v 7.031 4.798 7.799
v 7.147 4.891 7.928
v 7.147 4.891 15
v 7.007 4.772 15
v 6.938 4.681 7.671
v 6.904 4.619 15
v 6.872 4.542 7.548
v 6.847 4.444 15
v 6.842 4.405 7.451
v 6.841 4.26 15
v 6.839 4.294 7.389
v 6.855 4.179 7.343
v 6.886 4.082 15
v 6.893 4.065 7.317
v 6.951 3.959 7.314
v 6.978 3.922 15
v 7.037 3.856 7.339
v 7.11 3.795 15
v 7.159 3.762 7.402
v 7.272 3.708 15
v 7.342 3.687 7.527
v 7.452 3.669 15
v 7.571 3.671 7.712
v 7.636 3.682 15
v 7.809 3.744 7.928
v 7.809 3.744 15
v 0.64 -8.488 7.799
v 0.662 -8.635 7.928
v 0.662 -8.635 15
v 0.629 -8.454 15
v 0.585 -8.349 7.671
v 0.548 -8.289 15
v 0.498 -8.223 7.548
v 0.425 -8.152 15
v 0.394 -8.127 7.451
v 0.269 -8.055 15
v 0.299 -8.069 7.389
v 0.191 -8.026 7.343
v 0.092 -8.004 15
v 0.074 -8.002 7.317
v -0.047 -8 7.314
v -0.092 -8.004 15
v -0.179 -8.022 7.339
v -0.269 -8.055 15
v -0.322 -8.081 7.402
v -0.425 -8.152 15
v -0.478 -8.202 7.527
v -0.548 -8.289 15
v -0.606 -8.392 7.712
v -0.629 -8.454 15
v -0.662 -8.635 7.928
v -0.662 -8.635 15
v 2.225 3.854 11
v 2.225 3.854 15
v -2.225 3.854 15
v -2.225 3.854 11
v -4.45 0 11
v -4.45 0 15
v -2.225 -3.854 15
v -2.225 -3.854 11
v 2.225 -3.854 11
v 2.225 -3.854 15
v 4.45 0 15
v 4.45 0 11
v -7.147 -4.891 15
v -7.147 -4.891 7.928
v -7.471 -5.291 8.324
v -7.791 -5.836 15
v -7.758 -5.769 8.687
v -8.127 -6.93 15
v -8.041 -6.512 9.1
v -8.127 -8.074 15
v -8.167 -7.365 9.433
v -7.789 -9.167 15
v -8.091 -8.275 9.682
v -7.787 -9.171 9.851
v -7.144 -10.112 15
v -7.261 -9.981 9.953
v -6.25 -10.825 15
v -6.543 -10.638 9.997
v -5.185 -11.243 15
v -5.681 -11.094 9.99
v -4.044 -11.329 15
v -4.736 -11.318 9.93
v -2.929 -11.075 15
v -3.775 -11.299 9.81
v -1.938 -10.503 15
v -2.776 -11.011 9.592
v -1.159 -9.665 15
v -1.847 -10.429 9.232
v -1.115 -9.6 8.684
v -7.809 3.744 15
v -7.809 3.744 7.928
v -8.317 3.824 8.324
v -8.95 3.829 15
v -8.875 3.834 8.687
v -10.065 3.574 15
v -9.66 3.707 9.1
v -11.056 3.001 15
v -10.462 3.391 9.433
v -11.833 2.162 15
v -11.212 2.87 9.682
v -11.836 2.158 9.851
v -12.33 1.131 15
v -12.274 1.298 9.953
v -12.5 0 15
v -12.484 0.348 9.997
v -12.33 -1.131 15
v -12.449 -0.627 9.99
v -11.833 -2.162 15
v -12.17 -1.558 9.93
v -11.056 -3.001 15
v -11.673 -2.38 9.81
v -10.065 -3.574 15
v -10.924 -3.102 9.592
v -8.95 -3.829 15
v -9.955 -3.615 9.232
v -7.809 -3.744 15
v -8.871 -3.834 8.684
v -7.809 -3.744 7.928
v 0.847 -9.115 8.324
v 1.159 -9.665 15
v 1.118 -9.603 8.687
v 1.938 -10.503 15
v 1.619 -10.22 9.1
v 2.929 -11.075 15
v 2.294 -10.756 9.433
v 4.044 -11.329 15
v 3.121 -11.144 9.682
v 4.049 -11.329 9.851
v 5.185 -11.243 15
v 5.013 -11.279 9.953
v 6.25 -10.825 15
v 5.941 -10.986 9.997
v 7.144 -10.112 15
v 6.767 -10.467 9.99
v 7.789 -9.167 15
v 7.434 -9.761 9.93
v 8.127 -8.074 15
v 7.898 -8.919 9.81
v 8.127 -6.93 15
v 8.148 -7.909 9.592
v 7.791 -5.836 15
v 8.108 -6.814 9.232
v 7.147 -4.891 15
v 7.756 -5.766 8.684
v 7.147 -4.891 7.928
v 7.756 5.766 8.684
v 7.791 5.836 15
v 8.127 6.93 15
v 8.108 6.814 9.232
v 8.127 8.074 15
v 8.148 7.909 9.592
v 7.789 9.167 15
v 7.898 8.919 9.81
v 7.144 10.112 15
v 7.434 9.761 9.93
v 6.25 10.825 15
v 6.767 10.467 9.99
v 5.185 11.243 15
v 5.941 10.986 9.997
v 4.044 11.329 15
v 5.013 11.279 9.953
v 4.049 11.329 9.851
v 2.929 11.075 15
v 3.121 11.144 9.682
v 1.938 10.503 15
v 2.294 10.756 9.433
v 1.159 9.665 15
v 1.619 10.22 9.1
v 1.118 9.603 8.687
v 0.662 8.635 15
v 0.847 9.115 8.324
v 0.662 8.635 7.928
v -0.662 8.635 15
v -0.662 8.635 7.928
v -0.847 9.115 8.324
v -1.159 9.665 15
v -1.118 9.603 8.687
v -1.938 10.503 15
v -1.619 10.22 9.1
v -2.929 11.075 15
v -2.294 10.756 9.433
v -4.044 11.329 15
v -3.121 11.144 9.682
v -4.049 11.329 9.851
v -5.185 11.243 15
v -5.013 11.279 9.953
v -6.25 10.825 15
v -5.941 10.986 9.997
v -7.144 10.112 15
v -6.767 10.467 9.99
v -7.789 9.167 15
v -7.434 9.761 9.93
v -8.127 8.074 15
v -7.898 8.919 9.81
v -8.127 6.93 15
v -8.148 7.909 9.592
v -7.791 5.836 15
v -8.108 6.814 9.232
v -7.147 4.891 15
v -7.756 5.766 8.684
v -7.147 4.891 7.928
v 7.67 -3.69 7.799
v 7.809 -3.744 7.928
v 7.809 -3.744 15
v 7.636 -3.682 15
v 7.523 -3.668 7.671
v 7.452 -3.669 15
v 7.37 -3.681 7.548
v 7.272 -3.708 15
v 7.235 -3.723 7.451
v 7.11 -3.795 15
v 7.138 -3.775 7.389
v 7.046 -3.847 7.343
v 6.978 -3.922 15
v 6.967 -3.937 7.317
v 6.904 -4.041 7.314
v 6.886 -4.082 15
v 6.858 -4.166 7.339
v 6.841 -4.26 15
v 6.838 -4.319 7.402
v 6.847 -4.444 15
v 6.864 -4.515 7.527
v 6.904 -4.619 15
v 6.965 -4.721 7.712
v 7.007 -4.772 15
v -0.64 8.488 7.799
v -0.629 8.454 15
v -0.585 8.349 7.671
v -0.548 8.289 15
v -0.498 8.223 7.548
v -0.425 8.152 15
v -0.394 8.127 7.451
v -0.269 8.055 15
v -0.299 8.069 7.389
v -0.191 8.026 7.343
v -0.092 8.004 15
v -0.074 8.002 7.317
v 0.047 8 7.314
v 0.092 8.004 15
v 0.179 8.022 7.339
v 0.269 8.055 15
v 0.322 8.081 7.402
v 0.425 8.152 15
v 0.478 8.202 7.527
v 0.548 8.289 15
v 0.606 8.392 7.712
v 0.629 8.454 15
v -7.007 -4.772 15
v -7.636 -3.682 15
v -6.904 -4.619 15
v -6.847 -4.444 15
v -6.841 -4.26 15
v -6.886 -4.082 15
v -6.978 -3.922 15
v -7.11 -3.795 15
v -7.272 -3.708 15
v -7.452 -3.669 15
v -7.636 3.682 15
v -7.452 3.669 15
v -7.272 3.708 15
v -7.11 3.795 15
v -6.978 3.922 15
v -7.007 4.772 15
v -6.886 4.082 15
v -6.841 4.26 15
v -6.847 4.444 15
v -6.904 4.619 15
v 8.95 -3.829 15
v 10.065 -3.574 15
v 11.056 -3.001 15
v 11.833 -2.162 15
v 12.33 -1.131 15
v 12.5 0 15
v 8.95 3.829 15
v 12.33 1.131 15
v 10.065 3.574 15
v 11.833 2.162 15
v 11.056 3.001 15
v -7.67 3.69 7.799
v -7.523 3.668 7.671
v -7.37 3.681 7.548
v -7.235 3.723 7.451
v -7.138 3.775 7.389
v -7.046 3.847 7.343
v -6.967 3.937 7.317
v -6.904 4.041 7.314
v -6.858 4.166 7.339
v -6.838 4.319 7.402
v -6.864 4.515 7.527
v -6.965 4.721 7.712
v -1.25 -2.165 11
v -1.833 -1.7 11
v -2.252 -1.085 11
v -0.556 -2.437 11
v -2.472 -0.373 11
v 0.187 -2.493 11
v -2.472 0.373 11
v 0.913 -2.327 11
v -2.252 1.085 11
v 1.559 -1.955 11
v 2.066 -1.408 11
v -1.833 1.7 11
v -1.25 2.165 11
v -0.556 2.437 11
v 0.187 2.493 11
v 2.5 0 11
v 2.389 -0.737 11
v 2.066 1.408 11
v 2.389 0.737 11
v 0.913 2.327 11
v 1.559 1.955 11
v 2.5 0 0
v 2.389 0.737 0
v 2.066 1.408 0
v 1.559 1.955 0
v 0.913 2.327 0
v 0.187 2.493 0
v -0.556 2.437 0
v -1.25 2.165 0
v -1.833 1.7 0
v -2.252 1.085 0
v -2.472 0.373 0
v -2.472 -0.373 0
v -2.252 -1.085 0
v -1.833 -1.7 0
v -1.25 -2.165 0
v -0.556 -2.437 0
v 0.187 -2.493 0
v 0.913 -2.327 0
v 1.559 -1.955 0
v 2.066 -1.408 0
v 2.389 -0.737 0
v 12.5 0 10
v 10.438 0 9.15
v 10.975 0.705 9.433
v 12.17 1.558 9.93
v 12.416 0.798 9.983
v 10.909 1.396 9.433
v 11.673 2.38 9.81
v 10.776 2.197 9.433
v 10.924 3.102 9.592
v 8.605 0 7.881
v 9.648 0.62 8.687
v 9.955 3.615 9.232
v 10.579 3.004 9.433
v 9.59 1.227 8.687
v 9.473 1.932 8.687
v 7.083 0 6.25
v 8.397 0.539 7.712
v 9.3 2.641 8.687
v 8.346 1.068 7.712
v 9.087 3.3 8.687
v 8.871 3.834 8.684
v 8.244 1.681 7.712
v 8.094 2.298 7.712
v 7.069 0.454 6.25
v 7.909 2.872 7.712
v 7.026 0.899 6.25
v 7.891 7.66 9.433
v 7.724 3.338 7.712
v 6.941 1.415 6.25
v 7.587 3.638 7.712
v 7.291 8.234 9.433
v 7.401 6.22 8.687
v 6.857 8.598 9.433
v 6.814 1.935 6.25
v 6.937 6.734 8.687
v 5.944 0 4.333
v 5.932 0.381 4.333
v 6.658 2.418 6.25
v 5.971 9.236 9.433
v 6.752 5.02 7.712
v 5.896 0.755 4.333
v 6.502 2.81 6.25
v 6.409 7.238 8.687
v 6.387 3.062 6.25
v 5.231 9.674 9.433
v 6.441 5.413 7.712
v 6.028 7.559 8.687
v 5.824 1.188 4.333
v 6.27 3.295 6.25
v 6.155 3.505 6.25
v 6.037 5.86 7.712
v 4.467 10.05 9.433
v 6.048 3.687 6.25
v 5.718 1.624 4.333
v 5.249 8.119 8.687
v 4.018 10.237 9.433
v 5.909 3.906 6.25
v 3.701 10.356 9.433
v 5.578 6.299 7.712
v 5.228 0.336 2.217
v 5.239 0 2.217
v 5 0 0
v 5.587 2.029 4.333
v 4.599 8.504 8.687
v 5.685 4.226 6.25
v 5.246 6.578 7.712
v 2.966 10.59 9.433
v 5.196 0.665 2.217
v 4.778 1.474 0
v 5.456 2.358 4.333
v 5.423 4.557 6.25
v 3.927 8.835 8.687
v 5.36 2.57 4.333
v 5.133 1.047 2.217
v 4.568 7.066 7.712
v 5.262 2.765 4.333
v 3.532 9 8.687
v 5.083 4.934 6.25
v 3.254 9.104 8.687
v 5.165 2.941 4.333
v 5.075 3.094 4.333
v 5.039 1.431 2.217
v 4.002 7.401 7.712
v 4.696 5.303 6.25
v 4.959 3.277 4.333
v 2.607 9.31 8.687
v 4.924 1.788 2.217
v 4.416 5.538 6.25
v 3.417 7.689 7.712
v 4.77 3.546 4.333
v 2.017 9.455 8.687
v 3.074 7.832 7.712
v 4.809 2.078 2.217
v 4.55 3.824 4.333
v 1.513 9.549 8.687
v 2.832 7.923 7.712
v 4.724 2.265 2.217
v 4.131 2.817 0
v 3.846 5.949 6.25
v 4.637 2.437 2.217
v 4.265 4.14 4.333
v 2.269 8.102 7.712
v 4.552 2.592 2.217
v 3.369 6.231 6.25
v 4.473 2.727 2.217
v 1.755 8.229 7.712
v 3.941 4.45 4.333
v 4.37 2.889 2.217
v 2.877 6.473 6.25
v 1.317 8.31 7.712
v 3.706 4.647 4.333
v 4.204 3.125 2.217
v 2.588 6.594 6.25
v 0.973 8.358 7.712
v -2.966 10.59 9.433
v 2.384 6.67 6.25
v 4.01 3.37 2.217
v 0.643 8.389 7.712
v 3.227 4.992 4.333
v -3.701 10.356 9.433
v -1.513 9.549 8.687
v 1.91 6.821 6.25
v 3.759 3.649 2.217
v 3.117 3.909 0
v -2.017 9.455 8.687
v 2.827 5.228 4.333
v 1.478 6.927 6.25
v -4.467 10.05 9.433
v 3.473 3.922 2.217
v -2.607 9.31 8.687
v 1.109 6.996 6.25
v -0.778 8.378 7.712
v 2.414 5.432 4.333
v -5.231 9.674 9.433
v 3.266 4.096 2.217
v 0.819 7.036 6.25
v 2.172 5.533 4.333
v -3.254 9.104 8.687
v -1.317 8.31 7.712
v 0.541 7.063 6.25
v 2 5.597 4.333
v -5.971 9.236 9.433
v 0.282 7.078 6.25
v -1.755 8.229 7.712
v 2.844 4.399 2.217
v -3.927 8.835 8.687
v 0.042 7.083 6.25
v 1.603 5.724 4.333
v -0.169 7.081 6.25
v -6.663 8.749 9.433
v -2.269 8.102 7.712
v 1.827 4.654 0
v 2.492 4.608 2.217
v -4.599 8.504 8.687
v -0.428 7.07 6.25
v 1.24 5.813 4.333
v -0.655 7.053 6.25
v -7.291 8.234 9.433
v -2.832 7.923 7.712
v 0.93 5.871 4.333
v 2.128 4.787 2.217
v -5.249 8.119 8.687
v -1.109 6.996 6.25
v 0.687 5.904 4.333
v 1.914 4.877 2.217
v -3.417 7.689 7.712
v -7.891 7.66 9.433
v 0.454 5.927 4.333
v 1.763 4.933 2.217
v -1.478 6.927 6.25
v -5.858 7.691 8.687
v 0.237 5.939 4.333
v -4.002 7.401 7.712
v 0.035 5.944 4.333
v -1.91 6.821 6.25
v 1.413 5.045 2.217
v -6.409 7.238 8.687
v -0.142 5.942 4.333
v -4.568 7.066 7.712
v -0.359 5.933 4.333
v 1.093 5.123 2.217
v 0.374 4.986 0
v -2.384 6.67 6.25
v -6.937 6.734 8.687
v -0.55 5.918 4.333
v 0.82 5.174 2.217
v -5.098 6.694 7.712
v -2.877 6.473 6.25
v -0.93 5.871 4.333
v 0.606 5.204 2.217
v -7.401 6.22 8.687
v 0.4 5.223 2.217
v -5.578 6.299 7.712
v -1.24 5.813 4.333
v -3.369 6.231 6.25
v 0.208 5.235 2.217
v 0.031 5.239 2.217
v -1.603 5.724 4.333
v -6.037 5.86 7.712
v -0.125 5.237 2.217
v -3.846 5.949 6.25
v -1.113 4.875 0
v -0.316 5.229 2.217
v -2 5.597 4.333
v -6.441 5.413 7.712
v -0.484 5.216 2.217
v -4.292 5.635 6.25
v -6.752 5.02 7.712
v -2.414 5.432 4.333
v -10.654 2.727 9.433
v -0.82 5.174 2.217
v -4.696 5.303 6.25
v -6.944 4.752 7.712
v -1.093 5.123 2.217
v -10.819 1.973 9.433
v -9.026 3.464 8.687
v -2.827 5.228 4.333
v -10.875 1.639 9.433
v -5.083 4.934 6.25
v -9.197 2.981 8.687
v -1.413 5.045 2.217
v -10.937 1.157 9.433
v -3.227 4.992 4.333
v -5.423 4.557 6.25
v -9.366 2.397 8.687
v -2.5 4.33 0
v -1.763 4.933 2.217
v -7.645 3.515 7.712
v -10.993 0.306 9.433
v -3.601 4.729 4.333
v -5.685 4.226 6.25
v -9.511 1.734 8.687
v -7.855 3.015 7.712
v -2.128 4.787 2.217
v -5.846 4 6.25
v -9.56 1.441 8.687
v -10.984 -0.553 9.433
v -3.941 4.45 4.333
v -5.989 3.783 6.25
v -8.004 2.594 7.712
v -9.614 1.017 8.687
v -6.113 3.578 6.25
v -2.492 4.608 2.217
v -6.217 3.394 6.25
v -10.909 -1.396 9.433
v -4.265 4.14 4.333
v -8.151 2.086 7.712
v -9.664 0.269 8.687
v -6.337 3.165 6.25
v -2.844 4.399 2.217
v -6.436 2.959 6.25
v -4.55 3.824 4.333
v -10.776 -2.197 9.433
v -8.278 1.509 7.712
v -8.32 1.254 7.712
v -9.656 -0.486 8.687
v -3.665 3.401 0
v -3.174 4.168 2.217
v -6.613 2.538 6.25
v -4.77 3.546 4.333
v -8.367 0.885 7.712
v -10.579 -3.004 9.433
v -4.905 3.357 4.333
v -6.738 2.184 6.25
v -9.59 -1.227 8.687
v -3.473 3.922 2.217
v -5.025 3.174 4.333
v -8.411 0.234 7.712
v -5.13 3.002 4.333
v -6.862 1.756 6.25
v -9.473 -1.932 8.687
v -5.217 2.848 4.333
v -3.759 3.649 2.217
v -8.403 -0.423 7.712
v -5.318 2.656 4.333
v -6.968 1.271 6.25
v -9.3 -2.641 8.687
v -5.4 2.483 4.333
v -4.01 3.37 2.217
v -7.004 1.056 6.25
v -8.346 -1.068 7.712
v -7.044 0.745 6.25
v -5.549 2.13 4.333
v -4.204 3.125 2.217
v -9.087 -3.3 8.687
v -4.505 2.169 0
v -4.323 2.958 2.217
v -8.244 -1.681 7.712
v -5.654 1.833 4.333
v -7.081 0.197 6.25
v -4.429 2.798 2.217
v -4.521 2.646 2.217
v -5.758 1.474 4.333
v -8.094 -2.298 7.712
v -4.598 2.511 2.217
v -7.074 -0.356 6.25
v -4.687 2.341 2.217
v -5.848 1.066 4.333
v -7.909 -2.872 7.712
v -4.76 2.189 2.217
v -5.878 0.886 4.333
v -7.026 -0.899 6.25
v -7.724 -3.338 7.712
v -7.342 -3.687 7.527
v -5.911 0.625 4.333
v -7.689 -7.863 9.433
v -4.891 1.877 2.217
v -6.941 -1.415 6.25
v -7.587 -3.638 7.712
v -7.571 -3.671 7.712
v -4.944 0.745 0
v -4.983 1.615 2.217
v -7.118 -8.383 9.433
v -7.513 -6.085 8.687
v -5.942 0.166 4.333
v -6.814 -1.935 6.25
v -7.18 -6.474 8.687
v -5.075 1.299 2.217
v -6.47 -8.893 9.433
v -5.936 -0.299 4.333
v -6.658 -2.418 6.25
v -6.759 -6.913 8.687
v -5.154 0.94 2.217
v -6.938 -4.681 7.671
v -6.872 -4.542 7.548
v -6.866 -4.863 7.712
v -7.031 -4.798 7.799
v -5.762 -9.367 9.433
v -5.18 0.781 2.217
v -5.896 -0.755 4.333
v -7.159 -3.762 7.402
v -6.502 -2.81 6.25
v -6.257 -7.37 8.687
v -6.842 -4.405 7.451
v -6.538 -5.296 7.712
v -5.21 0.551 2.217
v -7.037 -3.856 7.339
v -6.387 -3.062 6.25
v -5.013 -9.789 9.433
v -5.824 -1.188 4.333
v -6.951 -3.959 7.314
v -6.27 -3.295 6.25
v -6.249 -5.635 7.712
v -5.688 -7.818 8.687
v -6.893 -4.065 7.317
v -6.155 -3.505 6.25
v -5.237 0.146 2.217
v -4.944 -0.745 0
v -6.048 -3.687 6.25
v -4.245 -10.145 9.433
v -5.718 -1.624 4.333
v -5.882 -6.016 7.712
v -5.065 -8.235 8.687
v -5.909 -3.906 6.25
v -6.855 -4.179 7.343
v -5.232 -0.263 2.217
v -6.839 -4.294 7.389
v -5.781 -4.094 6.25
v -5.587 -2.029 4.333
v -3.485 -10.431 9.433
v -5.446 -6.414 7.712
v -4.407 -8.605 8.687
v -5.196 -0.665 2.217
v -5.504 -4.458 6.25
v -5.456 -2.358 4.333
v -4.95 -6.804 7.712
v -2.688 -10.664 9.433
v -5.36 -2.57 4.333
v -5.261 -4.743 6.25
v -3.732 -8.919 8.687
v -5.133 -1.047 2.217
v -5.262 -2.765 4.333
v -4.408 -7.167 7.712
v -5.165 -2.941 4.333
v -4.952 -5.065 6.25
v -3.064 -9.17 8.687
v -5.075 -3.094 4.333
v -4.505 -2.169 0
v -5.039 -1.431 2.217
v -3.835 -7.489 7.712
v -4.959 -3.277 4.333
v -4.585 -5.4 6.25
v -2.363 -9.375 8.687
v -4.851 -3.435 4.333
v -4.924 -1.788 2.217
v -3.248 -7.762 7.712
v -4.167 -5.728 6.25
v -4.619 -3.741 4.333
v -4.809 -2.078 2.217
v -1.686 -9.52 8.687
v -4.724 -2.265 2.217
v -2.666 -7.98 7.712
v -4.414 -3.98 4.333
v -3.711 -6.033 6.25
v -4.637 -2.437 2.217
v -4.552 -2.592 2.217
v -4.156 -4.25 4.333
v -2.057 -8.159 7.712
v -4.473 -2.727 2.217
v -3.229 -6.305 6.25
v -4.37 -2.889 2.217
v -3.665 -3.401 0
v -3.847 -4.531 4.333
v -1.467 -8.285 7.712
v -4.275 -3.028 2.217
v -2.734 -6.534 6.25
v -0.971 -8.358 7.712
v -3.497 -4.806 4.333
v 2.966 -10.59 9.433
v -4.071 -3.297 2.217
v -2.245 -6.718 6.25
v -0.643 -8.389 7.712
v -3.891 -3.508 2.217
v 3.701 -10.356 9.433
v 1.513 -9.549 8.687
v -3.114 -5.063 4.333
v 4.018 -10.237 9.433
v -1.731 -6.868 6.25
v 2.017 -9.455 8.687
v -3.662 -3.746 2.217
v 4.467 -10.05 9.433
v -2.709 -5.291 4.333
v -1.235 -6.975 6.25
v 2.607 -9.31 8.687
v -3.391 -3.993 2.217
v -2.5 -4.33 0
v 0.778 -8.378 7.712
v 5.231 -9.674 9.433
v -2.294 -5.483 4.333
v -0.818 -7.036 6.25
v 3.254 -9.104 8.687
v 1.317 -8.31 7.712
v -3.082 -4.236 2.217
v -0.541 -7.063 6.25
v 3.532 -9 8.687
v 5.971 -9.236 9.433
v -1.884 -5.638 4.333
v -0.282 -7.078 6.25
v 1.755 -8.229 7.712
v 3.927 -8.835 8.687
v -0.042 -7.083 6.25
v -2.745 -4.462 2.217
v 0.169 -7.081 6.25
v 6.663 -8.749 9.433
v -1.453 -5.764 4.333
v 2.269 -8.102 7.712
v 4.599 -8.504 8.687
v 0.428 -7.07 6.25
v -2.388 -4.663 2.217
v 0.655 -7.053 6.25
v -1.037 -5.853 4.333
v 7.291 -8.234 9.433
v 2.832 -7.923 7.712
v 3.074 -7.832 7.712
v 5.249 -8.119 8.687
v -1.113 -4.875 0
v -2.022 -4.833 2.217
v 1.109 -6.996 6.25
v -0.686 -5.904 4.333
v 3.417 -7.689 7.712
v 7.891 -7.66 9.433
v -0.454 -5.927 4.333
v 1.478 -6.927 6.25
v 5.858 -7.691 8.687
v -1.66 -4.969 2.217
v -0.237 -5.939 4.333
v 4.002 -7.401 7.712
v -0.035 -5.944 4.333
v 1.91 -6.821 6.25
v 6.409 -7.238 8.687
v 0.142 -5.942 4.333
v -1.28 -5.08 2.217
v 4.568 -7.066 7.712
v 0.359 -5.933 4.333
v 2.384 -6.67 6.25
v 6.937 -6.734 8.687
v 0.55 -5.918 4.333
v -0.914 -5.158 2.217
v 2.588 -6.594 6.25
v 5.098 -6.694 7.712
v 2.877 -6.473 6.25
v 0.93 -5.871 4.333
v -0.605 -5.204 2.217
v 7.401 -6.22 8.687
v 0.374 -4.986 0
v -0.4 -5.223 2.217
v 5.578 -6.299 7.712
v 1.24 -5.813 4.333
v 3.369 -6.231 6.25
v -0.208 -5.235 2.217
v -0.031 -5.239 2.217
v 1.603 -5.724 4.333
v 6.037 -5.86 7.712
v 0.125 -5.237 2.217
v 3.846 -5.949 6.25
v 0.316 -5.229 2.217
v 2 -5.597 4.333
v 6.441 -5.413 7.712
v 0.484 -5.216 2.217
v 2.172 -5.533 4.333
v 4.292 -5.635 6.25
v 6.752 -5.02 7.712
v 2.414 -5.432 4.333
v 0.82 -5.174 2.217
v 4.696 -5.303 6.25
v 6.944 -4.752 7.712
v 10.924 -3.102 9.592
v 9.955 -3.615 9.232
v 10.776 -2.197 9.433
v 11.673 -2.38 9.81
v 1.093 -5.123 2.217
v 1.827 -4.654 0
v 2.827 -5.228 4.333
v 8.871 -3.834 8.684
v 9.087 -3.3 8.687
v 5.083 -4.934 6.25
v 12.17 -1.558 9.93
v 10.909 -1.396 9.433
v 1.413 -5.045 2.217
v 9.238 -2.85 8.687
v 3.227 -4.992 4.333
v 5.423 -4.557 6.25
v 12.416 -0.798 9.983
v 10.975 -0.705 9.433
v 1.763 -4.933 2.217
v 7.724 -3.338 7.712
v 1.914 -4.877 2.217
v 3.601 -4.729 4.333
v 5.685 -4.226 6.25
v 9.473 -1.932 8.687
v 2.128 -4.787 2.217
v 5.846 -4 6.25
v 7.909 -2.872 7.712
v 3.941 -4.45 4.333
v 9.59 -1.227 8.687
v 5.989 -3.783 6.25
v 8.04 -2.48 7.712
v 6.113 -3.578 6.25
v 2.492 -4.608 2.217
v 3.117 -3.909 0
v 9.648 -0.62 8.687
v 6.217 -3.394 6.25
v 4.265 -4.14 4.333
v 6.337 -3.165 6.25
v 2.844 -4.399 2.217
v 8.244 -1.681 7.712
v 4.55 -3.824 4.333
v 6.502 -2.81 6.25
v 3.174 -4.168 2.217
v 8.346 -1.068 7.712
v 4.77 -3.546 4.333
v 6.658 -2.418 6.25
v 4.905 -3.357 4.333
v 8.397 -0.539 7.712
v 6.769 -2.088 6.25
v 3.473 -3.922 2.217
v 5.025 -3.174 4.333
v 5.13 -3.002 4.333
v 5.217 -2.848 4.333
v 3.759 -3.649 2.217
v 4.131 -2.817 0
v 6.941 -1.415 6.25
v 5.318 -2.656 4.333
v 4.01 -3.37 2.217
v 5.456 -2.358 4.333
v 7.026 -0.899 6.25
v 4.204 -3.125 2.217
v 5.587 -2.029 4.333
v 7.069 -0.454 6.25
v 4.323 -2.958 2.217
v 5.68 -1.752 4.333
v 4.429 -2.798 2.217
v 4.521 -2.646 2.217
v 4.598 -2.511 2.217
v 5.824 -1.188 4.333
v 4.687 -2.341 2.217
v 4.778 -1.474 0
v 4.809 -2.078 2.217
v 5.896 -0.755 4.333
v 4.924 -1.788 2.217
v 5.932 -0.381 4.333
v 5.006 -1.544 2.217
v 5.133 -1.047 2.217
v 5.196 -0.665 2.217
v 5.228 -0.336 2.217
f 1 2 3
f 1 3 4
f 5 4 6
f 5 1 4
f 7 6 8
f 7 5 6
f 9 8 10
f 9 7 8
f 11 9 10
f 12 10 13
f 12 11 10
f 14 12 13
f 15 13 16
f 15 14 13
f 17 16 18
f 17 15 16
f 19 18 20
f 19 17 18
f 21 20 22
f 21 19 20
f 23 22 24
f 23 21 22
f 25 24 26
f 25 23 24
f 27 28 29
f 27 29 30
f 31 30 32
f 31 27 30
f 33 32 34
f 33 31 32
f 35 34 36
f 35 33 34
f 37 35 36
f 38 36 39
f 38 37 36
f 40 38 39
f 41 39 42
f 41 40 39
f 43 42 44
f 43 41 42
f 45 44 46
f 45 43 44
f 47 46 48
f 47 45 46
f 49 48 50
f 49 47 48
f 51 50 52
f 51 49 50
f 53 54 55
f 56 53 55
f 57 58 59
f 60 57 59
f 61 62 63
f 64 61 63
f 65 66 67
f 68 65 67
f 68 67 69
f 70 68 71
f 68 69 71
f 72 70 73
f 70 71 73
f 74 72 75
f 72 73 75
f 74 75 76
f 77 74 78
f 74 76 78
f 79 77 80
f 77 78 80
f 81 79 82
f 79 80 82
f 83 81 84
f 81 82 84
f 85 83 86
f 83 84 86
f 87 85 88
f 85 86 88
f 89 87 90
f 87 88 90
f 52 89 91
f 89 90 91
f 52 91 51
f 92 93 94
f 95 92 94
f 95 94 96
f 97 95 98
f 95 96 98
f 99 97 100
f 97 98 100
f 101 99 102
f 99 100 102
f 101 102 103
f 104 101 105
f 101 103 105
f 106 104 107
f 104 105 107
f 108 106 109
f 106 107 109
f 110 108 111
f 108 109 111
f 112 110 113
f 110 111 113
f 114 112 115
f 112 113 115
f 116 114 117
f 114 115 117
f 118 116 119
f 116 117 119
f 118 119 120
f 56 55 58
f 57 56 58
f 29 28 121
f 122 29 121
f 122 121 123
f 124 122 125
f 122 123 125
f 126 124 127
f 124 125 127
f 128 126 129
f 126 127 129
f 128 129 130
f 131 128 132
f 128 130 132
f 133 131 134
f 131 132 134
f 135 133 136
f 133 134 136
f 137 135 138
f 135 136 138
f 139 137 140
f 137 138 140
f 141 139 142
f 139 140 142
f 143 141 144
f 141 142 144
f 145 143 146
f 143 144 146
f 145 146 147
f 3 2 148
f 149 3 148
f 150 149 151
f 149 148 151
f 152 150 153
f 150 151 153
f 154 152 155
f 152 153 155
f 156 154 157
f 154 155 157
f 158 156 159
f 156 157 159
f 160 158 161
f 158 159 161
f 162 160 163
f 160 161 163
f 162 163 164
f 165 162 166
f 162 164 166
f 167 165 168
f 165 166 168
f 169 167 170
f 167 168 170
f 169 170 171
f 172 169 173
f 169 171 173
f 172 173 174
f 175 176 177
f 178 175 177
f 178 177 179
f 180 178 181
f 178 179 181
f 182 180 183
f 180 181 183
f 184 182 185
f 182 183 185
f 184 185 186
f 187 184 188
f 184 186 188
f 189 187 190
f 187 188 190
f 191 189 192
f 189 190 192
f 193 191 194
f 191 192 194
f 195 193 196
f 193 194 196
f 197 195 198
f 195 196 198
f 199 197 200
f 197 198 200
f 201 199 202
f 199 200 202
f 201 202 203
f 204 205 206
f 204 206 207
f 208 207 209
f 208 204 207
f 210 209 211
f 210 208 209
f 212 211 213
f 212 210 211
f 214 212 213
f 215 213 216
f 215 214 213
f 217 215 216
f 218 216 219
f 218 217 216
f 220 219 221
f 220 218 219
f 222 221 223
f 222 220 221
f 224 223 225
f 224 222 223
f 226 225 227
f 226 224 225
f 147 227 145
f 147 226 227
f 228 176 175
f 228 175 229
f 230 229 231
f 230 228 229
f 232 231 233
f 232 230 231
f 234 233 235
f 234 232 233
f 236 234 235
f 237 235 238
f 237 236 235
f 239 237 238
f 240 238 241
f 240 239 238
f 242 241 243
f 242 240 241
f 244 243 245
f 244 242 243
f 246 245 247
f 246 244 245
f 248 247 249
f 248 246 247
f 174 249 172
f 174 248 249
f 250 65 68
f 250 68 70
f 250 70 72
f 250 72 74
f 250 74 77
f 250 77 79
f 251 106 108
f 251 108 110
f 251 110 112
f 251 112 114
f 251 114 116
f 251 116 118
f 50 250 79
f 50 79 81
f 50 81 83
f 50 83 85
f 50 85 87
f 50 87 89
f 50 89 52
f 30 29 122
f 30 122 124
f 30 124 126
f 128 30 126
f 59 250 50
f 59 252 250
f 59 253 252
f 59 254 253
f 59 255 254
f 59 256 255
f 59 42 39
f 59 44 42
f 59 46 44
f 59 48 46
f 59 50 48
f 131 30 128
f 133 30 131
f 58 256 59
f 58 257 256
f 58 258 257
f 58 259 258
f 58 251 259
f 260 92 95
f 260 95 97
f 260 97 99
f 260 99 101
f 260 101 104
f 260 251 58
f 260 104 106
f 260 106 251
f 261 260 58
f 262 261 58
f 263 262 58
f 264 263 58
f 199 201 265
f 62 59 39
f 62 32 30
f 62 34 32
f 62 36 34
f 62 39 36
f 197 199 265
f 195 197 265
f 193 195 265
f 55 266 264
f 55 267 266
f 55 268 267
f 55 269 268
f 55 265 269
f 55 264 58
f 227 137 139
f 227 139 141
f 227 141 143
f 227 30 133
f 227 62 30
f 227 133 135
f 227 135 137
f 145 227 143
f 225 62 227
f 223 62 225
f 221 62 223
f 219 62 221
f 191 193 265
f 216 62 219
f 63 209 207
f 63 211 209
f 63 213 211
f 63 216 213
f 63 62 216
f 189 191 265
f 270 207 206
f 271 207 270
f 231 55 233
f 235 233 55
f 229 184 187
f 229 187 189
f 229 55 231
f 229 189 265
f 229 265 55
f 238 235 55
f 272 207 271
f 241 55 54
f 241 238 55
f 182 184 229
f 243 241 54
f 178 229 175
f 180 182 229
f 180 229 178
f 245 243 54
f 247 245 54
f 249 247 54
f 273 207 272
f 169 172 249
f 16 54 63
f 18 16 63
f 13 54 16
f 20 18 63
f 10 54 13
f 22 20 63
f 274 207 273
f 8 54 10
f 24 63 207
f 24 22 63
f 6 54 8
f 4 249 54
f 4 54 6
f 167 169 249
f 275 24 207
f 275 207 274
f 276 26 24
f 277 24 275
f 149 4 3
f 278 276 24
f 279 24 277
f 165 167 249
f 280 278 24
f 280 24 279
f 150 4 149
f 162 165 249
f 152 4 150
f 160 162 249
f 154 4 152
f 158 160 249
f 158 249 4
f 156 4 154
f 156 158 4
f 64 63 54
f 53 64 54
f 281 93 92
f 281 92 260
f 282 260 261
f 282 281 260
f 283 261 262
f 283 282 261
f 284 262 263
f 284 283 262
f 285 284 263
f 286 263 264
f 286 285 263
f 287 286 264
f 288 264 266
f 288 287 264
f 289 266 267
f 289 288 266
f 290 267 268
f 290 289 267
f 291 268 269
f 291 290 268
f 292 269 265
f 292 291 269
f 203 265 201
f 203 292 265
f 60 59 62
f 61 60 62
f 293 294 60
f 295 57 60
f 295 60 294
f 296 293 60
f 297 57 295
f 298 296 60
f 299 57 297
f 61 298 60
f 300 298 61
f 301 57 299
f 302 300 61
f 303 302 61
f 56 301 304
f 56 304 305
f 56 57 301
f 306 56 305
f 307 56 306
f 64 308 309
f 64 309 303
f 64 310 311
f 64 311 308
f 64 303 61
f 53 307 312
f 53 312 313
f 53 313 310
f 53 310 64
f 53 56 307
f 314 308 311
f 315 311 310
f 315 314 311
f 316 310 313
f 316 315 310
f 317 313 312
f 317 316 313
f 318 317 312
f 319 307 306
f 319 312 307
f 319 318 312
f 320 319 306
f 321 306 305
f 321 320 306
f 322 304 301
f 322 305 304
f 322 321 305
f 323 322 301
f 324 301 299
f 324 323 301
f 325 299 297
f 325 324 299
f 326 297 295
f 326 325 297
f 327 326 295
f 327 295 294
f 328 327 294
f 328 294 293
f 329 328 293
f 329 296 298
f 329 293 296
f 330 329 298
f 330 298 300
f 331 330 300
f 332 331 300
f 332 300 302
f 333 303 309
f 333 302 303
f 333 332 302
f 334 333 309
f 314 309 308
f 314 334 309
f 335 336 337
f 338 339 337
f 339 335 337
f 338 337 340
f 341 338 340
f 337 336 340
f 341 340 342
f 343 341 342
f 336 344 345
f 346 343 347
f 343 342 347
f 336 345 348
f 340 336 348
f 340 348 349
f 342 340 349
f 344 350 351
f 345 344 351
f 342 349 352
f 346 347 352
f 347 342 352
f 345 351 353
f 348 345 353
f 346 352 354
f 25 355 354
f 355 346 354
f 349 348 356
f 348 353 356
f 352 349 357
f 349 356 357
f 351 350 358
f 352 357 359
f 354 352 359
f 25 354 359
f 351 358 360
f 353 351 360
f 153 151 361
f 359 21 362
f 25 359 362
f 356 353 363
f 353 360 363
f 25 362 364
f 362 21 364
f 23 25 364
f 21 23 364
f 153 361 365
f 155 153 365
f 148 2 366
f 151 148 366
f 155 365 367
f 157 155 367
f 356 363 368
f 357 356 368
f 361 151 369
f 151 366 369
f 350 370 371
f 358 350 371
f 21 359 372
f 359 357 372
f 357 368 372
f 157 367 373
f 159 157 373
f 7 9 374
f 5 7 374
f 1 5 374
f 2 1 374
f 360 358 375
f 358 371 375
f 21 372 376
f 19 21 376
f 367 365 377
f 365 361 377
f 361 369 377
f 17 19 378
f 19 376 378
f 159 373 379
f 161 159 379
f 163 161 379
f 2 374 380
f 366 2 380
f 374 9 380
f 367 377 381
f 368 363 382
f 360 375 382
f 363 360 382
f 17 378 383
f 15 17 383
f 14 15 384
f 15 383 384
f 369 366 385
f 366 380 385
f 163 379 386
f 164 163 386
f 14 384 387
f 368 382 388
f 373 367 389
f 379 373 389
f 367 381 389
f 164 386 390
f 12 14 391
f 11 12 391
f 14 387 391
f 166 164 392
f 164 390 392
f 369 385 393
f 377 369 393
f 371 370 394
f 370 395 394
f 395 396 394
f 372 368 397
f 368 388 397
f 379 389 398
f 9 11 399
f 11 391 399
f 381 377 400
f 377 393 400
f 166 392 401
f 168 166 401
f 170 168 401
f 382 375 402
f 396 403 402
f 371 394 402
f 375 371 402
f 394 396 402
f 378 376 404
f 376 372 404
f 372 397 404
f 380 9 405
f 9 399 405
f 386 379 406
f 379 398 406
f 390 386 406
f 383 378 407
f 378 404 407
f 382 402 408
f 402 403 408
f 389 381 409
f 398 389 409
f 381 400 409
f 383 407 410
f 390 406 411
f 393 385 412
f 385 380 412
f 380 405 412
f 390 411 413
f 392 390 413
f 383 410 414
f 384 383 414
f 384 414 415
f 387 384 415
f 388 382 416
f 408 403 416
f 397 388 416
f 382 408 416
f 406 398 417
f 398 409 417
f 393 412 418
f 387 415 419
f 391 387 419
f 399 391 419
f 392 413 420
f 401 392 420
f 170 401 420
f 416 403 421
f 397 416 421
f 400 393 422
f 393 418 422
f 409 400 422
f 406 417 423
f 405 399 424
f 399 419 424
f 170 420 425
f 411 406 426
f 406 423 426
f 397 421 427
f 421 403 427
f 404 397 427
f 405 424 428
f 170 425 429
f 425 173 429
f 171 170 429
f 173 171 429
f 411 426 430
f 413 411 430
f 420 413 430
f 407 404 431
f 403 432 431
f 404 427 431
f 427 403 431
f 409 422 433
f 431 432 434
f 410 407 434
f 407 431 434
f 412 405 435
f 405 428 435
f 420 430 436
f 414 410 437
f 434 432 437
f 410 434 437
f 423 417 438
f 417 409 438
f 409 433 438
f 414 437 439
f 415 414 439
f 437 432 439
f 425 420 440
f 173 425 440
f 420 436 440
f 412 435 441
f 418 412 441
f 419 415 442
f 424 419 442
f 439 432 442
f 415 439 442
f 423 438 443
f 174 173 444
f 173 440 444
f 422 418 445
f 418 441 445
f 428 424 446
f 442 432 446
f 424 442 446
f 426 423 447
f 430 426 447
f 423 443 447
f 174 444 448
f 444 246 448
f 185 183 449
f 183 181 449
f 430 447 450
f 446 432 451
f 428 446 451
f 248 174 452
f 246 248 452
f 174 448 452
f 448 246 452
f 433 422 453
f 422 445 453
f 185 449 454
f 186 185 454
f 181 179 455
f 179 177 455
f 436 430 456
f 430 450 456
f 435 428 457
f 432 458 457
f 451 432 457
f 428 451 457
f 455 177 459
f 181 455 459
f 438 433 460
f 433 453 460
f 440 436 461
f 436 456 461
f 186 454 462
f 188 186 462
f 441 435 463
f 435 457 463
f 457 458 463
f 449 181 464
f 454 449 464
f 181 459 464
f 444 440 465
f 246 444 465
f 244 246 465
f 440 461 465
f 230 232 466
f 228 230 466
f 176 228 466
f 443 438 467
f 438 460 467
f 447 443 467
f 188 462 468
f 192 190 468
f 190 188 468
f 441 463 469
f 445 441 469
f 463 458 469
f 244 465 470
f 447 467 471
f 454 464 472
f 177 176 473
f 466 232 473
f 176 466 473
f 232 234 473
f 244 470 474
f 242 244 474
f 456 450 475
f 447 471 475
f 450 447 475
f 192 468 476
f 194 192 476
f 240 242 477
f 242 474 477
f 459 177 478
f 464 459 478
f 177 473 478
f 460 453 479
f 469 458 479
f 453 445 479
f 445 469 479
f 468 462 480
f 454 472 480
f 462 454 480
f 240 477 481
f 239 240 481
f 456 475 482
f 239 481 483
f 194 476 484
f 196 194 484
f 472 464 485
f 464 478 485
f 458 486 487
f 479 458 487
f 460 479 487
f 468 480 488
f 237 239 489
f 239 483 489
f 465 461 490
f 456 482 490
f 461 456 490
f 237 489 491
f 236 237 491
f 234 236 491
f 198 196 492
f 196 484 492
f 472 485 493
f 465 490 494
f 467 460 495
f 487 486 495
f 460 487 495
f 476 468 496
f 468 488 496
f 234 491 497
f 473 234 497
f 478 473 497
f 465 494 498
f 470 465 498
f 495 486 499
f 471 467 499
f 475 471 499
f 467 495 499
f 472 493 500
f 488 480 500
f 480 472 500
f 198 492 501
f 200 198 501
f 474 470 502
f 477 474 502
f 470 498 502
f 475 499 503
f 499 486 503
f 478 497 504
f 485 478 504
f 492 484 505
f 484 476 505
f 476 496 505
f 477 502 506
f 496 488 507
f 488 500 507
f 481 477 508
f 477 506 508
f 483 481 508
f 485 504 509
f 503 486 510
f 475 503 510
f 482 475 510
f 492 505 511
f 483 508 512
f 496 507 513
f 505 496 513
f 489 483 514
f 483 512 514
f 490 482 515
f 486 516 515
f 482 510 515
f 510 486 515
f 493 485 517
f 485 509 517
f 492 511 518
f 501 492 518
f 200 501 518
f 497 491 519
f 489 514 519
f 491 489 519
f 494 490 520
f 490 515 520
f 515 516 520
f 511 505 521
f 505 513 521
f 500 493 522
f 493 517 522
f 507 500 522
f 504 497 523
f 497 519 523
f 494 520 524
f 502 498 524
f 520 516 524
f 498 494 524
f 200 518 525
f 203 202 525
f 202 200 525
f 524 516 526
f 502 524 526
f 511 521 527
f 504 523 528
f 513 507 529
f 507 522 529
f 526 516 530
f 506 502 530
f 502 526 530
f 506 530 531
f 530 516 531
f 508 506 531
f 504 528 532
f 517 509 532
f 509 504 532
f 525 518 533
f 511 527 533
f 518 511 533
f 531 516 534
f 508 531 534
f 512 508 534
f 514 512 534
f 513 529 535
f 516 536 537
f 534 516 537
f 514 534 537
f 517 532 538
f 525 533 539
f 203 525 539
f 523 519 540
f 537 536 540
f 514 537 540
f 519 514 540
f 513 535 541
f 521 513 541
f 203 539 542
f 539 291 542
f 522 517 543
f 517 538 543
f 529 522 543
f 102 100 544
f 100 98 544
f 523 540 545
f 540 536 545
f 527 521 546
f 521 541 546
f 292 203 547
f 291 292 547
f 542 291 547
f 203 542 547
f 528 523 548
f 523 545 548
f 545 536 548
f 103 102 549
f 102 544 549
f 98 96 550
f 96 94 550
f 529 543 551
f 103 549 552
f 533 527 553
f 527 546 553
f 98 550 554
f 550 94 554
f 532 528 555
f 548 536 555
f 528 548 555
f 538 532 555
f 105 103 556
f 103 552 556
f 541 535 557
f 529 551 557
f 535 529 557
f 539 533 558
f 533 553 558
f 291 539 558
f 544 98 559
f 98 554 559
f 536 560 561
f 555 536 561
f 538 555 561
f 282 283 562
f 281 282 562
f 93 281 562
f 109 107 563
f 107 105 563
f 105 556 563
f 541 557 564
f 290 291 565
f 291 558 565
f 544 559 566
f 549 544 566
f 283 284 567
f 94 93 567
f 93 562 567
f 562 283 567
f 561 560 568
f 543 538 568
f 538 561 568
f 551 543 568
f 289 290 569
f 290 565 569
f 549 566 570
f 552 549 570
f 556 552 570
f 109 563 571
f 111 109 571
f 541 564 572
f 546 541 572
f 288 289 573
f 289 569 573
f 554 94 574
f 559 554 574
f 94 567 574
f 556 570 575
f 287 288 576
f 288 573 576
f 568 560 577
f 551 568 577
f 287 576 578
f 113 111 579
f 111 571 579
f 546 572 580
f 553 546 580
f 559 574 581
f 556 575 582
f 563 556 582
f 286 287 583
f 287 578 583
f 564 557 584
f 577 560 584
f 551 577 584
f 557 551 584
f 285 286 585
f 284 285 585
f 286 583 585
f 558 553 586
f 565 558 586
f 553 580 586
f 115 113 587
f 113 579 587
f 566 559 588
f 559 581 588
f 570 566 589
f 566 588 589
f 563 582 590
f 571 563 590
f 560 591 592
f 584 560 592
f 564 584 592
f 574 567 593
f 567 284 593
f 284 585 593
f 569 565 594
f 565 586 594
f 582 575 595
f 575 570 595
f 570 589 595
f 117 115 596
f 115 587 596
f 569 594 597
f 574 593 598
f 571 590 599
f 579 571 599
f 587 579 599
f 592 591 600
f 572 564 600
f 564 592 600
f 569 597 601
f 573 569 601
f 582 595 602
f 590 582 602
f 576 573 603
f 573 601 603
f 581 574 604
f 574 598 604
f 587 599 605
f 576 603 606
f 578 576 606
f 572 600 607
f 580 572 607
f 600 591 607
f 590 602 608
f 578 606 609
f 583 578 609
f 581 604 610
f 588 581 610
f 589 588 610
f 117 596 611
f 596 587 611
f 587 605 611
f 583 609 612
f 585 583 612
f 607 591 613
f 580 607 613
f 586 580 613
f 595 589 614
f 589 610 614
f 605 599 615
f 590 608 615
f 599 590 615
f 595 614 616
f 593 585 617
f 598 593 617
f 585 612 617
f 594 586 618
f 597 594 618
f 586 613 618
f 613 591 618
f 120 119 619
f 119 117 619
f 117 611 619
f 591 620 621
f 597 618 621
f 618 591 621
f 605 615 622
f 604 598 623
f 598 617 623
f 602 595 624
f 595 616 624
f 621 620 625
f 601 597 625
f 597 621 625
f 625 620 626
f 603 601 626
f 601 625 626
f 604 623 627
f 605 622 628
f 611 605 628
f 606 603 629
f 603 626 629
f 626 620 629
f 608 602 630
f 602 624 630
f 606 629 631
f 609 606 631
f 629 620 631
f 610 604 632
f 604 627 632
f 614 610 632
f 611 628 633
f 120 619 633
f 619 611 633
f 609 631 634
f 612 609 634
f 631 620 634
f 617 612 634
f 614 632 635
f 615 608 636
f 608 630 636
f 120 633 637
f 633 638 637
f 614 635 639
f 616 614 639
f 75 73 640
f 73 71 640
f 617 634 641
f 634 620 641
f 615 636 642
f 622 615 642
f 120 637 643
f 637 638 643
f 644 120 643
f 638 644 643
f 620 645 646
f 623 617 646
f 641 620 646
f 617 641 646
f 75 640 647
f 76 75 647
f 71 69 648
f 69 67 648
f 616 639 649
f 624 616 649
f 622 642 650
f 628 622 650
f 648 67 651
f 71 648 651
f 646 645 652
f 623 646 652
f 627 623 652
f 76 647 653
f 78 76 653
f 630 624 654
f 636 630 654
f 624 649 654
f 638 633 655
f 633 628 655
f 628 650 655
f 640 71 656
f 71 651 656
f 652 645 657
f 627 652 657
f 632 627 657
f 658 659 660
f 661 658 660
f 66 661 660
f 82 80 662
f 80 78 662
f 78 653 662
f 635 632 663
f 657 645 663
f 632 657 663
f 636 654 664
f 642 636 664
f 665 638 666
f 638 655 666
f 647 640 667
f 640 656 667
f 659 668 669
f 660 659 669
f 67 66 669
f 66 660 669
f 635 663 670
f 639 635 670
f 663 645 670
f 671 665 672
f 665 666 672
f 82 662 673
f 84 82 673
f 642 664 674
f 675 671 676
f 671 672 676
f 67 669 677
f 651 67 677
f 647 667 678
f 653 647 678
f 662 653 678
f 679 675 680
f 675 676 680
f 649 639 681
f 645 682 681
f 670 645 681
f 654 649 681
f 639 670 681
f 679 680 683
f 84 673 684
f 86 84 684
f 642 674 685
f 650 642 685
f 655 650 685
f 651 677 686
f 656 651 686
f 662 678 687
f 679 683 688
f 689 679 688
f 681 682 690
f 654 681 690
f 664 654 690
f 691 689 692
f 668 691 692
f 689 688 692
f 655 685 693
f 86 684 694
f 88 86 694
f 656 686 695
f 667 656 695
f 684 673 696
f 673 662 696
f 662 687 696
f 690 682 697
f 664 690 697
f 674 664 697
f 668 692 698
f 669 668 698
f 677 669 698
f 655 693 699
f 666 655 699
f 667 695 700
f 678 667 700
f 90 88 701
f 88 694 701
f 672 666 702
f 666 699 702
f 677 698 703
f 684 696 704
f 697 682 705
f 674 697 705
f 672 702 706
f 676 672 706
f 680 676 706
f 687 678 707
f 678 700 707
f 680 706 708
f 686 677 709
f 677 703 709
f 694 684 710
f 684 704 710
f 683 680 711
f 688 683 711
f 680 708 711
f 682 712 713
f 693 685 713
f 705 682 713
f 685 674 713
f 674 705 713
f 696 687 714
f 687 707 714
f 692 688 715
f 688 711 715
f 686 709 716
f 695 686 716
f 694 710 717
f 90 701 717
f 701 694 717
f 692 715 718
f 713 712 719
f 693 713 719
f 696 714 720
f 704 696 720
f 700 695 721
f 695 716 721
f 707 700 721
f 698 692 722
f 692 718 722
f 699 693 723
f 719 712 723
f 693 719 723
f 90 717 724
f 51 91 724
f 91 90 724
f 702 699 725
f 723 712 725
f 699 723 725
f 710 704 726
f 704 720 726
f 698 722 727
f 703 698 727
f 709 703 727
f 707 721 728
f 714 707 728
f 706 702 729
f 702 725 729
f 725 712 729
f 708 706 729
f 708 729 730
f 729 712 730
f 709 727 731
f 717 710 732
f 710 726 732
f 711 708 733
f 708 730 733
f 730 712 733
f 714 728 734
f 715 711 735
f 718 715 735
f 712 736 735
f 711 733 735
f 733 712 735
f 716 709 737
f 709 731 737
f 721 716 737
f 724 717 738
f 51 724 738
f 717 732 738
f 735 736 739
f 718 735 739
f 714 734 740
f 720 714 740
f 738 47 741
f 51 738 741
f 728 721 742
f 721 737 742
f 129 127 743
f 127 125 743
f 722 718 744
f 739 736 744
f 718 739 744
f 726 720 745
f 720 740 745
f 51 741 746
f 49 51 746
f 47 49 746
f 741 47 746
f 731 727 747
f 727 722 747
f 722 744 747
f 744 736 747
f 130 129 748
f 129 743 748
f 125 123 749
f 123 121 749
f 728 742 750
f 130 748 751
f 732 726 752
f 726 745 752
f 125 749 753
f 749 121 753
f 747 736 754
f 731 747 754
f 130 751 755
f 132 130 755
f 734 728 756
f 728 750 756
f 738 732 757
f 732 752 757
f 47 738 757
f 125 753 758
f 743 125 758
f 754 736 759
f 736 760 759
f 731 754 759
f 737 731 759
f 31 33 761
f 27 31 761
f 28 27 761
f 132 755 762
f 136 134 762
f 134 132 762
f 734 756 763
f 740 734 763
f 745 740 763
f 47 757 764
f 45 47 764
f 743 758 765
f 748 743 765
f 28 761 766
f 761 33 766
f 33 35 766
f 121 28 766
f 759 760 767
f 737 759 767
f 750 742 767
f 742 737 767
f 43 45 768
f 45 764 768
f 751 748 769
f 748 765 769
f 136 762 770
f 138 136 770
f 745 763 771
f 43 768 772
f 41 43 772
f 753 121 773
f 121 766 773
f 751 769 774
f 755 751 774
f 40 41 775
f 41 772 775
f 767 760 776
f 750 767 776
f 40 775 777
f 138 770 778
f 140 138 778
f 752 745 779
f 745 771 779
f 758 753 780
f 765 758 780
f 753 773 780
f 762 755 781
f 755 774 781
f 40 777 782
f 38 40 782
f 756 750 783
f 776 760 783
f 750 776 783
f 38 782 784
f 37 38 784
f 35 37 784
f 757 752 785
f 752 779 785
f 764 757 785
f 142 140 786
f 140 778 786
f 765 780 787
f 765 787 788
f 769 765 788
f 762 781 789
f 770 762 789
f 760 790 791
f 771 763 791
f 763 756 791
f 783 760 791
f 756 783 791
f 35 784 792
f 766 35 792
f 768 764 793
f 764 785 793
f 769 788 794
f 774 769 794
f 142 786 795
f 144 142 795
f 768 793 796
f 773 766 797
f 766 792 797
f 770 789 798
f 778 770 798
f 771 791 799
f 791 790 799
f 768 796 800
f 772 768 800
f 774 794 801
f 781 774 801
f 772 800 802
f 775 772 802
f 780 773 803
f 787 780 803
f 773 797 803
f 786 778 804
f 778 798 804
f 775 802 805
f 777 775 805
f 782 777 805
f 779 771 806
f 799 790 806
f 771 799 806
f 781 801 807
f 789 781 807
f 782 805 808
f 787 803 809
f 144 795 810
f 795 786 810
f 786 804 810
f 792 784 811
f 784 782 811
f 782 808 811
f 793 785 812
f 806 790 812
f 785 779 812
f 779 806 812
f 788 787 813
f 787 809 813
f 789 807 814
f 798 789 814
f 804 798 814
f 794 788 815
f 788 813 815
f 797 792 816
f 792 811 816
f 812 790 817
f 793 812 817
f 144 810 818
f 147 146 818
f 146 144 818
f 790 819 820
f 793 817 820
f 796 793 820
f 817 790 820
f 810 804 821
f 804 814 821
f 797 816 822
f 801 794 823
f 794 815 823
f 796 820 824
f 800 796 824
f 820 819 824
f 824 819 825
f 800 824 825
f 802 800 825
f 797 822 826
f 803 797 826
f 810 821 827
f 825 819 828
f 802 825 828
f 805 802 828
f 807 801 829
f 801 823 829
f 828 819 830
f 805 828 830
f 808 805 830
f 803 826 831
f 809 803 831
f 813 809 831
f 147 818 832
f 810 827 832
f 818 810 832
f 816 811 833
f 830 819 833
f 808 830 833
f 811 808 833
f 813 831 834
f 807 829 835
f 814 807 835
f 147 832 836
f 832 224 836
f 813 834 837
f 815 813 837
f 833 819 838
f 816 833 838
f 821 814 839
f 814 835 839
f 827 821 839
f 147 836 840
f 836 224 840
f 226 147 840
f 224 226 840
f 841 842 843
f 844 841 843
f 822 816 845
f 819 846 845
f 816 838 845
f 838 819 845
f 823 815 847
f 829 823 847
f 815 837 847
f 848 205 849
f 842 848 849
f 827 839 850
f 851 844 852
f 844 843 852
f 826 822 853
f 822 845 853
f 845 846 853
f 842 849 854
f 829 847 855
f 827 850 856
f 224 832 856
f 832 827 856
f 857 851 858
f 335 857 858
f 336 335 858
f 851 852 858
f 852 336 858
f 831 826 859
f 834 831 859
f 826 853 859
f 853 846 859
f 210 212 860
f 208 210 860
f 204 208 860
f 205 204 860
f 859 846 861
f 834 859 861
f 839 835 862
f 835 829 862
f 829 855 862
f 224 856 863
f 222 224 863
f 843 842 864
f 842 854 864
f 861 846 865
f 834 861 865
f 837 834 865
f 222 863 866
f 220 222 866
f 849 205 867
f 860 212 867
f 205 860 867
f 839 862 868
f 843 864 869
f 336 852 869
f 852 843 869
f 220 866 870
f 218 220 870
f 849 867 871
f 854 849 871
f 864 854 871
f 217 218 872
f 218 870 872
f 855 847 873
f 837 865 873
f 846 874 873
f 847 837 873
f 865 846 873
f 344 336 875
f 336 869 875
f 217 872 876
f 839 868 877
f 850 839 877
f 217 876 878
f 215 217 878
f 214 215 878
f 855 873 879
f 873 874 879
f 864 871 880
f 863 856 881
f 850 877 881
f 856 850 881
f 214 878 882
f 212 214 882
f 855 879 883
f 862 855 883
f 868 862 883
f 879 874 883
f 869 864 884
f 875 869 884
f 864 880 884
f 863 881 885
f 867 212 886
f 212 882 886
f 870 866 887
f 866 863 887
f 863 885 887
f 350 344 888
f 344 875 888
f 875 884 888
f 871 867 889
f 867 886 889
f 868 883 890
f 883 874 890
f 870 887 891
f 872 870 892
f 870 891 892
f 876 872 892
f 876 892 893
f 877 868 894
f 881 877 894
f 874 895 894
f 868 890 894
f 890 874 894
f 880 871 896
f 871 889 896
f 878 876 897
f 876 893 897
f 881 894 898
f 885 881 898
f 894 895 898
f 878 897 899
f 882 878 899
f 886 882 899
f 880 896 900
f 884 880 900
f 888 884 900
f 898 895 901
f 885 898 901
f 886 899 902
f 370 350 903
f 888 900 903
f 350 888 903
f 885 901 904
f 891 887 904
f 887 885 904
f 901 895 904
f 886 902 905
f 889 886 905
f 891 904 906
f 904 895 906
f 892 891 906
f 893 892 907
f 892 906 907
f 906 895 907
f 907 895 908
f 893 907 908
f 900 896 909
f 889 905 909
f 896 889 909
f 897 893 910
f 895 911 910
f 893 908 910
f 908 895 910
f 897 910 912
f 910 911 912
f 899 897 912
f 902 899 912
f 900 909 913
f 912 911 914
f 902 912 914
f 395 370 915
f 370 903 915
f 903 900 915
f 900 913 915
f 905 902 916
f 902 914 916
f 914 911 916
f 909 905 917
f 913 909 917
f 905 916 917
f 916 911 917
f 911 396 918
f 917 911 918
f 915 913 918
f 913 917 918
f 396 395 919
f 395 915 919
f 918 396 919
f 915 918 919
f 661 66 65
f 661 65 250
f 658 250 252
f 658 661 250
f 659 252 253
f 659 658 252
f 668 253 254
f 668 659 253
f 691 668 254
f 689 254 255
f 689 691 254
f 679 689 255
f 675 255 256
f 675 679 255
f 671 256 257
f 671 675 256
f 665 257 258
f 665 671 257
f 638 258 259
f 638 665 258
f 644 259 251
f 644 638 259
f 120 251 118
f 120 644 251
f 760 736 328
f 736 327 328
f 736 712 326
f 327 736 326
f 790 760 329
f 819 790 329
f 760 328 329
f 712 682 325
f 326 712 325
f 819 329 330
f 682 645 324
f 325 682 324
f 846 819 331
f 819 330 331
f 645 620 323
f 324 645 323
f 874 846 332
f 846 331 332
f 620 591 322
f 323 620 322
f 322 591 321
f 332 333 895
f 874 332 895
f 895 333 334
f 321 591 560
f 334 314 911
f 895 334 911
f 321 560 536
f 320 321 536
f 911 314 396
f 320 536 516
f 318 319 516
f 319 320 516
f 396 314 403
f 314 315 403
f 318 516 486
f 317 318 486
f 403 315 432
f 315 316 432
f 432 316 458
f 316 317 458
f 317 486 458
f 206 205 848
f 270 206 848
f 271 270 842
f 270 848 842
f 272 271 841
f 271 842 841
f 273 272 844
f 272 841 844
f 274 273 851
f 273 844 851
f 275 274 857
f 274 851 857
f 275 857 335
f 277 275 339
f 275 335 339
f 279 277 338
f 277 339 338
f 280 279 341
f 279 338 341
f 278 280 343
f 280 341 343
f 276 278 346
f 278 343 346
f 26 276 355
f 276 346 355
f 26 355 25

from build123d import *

# Parameters (mm, degrees)
SKETCH026_R     = 2.5
PAD010_DEPTH    = 15
POCKET010_DEPTH = 4


with BuildPart() as part:
    # Sketch026 → Pad010 (new body)
    with BuildSketch(Plane.XY):
        with BuildLine():
            ThreePointArc((7.1470904861, 4.890715447), (6.25, 10.8253175473), (0.6619385767, 8.6349196476))
            ThreePointArc((-0.6619385767, 8.6349196476), (0, 7.9978308267), (0.6619385767, 8.6349196476))
            ThreePointArc((-0.6619385767, 8.6349196476), (-6.25, 10.8253175473), (-7.1470904861, 4.890715447))
            ThreePointArc((-7.8090290628, 3.7442042006), (-6.9263246711, 3.9989154133), (-7.1470904861, 4.890715447))
            ThreePointArc((-7.8090290628, 3.7442042006), (-12.5, 0), (-7.8090290628, -3.7442042006))
            ThreePointArc((-7.1470904861, -4.890715447), (-6.9263246711, -3.9989154133), (-7.8090290628, -3.7442042006))
            ThreePointArc((-7.1470904861, -4.890715447), (-6.25, -10.8253175473), (-0.6619385767, -8.6349196476))
            ThreePointArc((0.6619385767, -8.6349196476), (0, -7.9978308267), (-0.6619385767, -8.6349196476))
            ThreePointArc((0.6619385767, -8.6349196476), (6.25, -10.8253175473), (7.1470904861, -4.890715447))
            ThreePointArc((7.8090290628, -3.7442042006), (6.9263246711, -3.9989154133), (7.1470904861, -4.890715447))
            ThreePointArc((7.8090290628, -3.7442042006), (12.5, 0), (7.8090290628, 3.7442042006))
            ThreePointArc((7.1470904861, 4.890715447), (6.9263246711, 3.9989154133), (7.8090290628, 3.7442042006))
        make_face()
        Circle(SKETCH026_R, mode=Mode.SUBTRACT)
    extrude(amount=PAD010_DEPTH)

    # Sketch027 (on Face15 of Pad010) → Pocket010 (cut)
    with BuildSketch(Plane.XY.offset(15)):
        Polygon((2.225, -3.8538130468), (4.45, 0), (2.225, 3.8538130468), (-2.225, 3.8538130468), (-4.45, 0), (-2.225, -3.8538130468), align=None)
    extrude(amount=-POCKET010_DEPTH, mode=Mode.SUBTRACT)

    # Sketch028 → Groove001 (revolve, cut)
    with BuildSketch(Plane.XZ):
        with BuildLine():
            ThreePointArc((12.5, 10), (7.0833333333, 6.25), (5, 0))
            Line((5, 0), (13.5, 0))
            Line((13.5, 0), (13.5, 10))
            Line((13.5, 10), (12.5, 10))
        make_face()
    revolve(axis=Axis((0, 0, 0), (0, 0, 1)), mode=Mode.SUBTRACT)


solid = part.part
